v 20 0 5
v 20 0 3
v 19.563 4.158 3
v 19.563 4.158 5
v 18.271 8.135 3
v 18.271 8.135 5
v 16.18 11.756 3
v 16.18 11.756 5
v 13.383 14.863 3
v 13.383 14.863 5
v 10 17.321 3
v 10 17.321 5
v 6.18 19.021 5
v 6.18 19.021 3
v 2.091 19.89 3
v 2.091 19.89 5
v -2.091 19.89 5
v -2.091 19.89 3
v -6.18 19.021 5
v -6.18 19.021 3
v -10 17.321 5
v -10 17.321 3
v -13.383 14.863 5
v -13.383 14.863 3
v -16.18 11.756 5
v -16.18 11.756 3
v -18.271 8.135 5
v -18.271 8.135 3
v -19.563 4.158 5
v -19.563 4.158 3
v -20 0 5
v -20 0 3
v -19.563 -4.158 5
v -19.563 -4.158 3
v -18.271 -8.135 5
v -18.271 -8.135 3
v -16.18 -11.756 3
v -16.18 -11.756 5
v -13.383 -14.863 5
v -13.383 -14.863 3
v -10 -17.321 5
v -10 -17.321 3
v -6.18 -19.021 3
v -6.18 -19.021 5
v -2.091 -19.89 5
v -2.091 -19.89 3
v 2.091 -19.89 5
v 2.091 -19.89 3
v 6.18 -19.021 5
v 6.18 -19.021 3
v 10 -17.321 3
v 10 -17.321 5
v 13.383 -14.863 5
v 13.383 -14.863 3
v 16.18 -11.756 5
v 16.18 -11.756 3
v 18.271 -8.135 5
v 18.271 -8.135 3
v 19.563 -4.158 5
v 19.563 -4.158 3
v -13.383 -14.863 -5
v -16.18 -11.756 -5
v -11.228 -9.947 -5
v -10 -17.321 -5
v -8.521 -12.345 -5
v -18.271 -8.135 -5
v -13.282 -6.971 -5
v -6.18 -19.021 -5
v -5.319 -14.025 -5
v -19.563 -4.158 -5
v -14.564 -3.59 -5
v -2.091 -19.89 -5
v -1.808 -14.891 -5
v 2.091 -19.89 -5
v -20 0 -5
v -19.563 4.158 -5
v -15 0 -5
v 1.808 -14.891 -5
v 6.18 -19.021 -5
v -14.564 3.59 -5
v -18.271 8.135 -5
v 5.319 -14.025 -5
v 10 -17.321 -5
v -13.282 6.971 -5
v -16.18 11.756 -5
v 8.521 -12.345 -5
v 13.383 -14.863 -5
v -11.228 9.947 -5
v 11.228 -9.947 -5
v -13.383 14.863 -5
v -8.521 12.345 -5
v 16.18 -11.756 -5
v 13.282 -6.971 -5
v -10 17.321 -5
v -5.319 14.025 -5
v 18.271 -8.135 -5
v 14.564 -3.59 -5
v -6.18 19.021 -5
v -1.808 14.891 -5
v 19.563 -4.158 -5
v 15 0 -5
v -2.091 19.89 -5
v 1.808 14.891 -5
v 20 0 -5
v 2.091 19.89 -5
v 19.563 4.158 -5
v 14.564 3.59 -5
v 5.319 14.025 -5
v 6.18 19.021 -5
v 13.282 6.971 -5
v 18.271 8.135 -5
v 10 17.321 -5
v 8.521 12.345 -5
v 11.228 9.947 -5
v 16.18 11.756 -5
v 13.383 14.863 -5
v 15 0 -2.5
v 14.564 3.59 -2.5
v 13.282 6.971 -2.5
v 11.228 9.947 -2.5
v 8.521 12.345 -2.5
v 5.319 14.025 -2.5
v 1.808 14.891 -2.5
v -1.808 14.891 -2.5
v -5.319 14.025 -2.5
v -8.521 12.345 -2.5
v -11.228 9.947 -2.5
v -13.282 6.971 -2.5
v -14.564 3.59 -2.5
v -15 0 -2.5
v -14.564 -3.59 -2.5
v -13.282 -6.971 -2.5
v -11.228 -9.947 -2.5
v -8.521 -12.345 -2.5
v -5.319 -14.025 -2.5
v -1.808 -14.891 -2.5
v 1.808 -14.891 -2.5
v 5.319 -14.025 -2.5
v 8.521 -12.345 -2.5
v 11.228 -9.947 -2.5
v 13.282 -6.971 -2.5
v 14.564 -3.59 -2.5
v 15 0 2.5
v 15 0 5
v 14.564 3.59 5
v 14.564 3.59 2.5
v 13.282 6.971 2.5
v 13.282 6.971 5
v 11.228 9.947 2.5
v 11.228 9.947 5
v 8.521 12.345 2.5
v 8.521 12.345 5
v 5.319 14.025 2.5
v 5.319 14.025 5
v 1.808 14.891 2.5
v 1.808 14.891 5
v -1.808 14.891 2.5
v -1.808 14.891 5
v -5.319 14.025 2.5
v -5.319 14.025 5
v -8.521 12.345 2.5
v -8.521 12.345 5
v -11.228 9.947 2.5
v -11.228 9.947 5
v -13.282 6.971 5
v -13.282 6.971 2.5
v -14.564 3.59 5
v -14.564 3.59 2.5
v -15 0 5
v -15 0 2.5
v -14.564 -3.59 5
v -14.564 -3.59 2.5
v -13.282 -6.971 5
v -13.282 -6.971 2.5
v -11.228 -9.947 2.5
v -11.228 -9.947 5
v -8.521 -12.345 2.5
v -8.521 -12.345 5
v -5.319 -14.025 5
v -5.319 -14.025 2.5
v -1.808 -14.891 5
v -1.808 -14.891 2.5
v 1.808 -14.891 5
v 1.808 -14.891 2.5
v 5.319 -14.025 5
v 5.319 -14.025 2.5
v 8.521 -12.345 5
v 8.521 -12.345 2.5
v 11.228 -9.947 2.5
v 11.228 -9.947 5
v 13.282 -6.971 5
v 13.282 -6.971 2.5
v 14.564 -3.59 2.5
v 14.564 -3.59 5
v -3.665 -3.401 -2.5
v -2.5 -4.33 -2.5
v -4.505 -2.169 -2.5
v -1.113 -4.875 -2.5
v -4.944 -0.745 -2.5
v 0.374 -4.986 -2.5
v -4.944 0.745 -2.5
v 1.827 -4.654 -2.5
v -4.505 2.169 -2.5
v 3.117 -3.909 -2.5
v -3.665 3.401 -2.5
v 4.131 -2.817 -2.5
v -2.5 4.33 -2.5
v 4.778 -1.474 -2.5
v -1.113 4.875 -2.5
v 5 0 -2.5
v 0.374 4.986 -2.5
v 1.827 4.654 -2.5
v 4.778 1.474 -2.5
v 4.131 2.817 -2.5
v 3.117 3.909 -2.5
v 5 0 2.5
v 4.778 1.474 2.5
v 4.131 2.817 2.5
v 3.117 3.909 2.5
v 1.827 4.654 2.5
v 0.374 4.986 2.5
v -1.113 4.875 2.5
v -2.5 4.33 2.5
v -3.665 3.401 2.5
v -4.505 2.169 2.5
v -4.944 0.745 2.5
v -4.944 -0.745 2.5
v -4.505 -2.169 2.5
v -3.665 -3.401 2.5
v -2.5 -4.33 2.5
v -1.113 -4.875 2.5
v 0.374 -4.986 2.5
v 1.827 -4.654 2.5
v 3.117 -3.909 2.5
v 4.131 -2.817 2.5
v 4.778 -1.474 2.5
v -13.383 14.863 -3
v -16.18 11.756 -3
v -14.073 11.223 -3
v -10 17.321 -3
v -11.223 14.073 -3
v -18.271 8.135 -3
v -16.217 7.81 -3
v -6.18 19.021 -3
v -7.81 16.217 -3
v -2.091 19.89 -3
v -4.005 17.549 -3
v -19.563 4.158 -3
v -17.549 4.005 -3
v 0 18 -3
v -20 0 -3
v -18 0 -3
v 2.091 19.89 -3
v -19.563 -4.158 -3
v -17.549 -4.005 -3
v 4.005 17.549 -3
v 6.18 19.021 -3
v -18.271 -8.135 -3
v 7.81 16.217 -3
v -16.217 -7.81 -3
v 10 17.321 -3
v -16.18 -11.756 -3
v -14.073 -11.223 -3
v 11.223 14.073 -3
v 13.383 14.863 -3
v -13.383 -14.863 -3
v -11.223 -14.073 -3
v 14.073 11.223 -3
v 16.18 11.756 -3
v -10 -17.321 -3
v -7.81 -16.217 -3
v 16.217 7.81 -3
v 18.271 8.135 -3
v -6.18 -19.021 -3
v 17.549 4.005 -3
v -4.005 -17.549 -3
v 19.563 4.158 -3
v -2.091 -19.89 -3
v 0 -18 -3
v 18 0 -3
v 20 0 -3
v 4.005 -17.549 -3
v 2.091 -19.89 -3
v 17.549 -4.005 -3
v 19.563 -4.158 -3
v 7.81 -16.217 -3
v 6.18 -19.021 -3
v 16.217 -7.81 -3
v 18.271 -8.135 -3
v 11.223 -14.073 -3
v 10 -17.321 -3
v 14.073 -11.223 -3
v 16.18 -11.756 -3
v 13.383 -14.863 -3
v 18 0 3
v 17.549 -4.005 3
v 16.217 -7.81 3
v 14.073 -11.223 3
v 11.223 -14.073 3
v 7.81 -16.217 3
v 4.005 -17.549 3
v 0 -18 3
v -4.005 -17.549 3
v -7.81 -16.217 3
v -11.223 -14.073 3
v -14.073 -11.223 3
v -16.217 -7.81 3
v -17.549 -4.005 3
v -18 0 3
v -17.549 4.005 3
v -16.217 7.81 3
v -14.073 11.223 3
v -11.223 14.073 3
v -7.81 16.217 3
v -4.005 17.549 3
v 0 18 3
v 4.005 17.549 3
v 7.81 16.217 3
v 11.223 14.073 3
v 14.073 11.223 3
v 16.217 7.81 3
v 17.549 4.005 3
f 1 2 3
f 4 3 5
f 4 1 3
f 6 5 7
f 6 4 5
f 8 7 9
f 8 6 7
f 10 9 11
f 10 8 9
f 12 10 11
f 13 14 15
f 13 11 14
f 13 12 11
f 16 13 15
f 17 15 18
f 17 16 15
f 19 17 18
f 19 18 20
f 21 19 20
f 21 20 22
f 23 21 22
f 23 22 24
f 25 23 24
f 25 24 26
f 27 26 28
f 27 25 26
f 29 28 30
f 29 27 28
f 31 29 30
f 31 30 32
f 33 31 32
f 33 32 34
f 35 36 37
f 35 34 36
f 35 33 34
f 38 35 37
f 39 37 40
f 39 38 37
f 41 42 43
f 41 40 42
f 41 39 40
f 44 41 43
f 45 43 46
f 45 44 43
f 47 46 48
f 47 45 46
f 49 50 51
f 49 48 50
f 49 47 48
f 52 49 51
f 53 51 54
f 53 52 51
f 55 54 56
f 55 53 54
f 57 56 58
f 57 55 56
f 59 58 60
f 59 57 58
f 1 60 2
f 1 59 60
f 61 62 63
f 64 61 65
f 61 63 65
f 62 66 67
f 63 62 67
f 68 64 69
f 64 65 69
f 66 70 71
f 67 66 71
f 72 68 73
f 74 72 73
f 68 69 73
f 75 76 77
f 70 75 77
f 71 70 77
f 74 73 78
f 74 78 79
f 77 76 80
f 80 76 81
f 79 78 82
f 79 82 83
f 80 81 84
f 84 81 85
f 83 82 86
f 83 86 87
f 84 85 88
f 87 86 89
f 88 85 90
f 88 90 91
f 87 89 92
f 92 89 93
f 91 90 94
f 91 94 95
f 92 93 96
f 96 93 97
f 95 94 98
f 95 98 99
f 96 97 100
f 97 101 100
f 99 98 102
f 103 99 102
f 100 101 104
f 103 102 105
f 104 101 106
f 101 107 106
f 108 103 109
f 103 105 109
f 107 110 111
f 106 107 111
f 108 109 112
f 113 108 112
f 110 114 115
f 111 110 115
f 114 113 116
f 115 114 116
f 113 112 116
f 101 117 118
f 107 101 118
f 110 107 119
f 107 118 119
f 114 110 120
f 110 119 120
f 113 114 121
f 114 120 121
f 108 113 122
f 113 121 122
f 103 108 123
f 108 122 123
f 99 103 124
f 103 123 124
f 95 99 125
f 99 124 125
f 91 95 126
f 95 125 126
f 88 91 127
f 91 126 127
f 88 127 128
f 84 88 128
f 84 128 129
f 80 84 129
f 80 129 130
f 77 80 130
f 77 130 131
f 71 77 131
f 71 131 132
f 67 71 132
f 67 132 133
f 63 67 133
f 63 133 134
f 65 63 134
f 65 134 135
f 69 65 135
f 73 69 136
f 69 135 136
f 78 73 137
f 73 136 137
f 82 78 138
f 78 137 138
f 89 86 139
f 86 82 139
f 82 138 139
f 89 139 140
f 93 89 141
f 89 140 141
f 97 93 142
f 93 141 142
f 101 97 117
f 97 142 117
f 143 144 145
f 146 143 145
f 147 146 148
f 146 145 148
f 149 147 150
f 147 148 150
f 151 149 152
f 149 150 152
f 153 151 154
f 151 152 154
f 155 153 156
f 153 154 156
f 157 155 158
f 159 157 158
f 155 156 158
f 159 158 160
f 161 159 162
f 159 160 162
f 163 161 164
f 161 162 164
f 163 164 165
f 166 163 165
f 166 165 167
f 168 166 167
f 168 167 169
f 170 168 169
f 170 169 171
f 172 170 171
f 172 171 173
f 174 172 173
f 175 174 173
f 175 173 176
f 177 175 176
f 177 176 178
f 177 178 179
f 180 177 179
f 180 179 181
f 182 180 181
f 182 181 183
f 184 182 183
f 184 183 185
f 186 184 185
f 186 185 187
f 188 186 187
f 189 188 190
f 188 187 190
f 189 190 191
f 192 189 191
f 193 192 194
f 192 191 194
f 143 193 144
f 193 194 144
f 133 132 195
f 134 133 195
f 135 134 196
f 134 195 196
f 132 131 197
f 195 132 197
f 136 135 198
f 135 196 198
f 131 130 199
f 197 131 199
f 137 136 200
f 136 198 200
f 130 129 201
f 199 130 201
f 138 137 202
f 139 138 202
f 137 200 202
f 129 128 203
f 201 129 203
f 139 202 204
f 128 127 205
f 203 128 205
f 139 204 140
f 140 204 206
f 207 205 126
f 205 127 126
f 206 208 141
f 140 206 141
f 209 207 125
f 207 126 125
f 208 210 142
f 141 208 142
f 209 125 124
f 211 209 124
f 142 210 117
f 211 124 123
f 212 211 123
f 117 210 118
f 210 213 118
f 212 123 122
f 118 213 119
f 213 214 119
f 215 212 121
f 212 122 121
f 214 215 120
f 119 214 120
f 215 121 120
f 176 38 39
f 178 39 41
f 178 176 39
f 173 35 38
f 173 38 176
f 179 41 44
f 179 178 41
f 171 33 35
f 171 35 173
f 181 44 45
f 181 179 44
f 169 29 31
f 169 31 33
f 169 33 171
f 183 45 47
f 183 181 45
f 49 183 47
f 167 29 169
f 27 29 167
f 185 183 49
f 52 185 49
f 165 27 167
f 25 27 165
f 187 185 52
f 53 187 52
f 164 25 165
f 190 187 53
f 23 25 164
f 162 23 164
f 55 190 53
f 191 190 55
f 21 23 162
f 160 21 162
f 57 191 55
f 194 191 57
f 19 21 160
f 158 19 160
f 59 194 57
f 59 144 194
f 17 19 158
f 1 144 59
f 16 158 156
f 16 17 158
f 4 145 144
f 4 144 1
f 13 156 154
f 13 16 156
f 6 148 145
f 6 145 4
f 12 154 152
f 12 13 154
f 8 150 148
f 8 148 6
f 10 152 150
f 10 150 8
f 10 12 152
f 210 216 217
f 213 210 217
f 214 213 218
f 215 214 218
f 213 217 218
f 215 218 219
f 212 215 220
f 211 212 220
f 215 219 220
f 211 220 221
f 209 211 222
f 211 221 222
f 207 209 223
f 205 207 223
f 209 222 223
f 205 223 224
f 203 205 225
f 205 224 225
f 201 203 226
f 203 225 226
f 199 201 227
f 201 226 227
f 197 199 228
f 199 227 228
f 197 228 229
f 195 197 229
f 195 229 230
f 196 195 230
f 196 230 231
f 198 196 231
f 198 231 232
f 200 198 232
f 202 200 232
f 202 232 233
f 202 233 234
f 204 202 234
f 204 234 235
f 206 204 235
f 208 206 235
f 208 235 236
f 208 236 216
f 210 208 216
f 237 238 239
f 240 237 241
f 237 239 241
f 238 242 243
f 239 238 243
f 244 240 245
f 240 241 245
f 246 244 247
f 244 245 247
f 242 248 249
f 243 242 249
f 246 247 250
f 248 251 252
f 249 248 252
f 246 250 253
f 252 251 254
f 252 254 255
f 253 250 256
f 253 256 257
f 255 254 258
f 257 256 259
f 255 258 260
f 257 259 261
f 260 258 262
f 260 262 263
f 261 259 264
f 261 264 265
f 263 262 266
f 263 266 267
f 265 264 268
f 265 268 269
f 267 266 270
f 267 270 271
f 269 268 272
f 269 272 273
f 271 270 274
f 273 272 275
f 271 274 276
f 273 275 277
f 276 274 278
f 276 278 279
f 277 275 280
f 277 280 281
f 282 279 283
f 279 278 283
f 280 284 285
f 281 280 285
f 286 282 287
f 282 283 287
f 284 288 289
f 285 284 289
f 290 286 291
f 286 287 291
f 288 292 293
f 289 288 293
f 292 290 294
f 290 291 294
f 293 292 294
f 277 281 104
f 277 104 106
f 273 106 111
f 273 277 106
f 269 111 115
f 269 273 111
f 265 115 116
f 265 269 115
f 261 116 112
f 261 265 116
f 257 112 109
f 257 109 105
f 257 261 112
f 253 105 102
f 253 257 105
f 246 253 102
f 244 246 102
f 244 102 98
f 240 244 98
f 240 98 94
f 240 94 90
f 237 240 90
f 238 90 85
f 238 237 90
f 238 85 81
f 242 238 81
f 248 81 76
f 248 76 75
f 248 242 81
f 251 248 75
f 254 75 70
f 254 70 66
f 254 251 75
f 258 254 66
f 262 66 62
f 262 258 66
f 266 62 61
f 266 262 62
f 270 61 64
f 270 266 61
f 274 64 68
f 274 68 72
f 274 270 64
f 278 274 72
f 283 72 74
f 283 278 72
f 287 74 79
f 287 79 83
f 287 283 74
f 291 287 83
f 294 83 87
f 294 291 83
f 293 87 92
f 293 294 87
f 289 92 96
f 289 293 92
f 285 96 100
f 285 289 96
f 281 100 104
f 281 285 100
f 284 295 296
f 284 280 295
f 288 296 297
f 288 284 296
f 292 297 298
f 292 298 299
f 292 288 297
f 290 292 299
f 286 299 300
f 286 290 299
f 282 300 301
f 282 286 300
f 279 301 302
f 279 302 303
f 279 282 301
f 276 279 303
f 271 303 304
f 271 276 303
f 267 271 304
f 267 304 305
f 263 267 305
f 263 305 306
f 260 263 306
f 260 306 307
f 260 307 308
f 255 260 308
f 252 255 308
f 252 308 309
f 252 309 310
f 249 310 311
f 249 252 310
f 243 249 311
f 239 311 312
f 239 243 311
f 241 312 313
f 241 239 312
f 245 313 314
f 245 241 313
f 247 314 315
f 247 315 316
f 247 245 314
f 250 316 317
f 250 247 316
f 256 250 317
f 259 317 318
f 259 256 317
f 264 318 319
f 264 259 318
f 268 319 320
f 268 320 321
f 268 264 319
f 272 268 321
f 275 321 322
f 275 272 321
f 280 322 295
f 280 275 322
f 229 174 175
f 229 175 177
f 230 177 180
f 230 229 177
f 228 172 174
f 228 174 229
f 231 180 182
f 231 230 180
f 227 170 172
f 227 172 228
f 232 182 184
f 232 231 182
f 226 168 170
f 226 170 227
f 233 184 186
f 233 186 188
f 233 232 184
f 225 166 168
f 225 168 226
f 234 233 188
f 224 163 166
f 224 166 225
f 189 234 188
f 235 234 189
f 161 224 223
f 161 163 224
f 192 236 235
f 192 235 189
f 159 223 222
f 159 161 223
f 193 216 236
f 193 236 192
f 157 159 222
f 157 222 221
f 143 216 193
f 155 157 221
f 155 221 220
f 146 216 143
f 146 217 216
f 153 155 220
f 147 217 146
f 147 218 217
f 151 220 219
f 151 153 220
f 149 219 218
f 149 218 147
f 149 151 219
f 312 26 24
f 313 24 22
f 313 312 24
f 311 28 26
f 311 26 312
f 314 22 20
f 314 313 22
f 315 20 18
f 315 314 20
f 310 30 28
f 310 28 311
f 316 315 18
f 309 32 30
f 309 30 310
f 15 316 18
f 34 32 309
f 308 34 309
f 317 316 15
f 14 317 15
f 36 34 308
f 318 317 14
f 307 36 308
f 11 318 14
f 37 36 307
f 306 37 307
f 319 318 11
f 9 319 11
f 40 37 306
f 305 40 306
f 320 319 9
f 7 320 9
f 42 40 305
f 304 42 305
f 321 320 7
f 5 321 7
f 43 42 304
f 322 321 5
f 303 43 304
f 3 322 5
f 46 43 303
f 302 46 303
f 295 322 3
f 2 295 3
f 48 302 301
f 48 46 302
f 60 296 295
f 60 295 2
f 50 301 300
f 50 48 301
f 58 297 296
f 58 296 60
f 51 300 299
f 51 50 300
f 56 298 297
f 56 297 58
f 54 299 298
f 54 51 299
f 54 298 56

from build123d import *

# Parameters (mm, degrees)
SKETCH_1_R          = 20
SKETCH_1_R_2        = 15
SKETCH_1_R_3        = 5
EXTRUDE_2_DEPTH     = 5
SKETCH_2_R          = 15
CUT_EXTRUDE_1_DEPTH = 5
SKETCH_3_R          = 15
CUT_EXTRUDE_6_DEPTH = 31
SKETCH_4_R          = 15
EXTRUDE_3_DEPTH     = 2.5
SKETCH_5_R          = 5
CUT_EXTRUDE_7_DEPTH = 30.261749777
SKETCH_8_W          = 2
SKETCH_8_H          = 6


with BuildPart() as part:
    # 草图1 → 凸台-拉伸2 (new, symmetric)
    # profile 1 of 2: a face of its own
    with BuildSketch(Plane.XY):
        Circle(SKETCH_1_R)
        Circle(SKETCH_1_R_2, mode=Mode.SUBTRACT)
    # profile 2 of 2: a face of its own
    with BuildSketch(Plane.XY):
        Circle(SKETCH_1_R_2)
        Circle(SKETCH_1_R_3, mode=Mode.SUBTRACT)
    extrude(amount=EXTRUDE_2_DEPTH, both=True)

    # 草图2 → 切除-拉伸1 (cut)
    with BuildSketch(Plane.XY.offset(5)):
        Circle(SKETCH_2_R)
    extrude(amount=-CUT_EXTRUDE_1_DEPTH, mode=Mode.SUBTRACT)

    # 草图3 → 切除-拉伸6 (cut, through all)
    with BuildSketch(Plane(origin=(0, 0, -5), x_dir=(-1, 0, 0), z_dir=(0, 0, -1))):
        with Locations(Location((0, 0, 0), (0, 0, 180))):
            Circle(SKETCH_3_R)
    extrude(amount=-CUT_EXTRUDE_6_DEPTH, mode=Mode.SUBTRACT)

    # 草图4 → 凸台-拉伸3 (add, symmetric)
    with BuildSketch(Plane.XY):
        Circle(SKETCH_4_R)
    extrude(amount=EXTRUDE_3_DEPTH, both=True)

    # 草图5 → 切除-拉伸7 (cut, through all)
    with BuildSketch(Plane.XY.offset(2.5)):
        Circle(SKETCH_5_R)
    extrude(amount=-CUT_EXTRUDE_7_DEPTH, mode=Mode.SUBTRACT)

    # 草图8 → 切除-旋转1 (revolve, cut)
    with BuildSketch(Plane(origin=(0, 0, 0), x_dir=(1, 0, 0), z_dir=(0, 1, 0)), mode=Mode.PRIVATE) as cut_revolve_1_sk:
        with Locations((-19, 0)):
            Rectangle(SKETCH_8_W, SKETCH_8_H)
    revolve(cut_revolve_1_sk.sketch.rotate(Axis((0, 0, 0), (0, 0, -1)), 180), axis=Axis((0, 0, 0), (0, 0, -1)), mode=Mode.SUBTRACT)


solid = part.part
